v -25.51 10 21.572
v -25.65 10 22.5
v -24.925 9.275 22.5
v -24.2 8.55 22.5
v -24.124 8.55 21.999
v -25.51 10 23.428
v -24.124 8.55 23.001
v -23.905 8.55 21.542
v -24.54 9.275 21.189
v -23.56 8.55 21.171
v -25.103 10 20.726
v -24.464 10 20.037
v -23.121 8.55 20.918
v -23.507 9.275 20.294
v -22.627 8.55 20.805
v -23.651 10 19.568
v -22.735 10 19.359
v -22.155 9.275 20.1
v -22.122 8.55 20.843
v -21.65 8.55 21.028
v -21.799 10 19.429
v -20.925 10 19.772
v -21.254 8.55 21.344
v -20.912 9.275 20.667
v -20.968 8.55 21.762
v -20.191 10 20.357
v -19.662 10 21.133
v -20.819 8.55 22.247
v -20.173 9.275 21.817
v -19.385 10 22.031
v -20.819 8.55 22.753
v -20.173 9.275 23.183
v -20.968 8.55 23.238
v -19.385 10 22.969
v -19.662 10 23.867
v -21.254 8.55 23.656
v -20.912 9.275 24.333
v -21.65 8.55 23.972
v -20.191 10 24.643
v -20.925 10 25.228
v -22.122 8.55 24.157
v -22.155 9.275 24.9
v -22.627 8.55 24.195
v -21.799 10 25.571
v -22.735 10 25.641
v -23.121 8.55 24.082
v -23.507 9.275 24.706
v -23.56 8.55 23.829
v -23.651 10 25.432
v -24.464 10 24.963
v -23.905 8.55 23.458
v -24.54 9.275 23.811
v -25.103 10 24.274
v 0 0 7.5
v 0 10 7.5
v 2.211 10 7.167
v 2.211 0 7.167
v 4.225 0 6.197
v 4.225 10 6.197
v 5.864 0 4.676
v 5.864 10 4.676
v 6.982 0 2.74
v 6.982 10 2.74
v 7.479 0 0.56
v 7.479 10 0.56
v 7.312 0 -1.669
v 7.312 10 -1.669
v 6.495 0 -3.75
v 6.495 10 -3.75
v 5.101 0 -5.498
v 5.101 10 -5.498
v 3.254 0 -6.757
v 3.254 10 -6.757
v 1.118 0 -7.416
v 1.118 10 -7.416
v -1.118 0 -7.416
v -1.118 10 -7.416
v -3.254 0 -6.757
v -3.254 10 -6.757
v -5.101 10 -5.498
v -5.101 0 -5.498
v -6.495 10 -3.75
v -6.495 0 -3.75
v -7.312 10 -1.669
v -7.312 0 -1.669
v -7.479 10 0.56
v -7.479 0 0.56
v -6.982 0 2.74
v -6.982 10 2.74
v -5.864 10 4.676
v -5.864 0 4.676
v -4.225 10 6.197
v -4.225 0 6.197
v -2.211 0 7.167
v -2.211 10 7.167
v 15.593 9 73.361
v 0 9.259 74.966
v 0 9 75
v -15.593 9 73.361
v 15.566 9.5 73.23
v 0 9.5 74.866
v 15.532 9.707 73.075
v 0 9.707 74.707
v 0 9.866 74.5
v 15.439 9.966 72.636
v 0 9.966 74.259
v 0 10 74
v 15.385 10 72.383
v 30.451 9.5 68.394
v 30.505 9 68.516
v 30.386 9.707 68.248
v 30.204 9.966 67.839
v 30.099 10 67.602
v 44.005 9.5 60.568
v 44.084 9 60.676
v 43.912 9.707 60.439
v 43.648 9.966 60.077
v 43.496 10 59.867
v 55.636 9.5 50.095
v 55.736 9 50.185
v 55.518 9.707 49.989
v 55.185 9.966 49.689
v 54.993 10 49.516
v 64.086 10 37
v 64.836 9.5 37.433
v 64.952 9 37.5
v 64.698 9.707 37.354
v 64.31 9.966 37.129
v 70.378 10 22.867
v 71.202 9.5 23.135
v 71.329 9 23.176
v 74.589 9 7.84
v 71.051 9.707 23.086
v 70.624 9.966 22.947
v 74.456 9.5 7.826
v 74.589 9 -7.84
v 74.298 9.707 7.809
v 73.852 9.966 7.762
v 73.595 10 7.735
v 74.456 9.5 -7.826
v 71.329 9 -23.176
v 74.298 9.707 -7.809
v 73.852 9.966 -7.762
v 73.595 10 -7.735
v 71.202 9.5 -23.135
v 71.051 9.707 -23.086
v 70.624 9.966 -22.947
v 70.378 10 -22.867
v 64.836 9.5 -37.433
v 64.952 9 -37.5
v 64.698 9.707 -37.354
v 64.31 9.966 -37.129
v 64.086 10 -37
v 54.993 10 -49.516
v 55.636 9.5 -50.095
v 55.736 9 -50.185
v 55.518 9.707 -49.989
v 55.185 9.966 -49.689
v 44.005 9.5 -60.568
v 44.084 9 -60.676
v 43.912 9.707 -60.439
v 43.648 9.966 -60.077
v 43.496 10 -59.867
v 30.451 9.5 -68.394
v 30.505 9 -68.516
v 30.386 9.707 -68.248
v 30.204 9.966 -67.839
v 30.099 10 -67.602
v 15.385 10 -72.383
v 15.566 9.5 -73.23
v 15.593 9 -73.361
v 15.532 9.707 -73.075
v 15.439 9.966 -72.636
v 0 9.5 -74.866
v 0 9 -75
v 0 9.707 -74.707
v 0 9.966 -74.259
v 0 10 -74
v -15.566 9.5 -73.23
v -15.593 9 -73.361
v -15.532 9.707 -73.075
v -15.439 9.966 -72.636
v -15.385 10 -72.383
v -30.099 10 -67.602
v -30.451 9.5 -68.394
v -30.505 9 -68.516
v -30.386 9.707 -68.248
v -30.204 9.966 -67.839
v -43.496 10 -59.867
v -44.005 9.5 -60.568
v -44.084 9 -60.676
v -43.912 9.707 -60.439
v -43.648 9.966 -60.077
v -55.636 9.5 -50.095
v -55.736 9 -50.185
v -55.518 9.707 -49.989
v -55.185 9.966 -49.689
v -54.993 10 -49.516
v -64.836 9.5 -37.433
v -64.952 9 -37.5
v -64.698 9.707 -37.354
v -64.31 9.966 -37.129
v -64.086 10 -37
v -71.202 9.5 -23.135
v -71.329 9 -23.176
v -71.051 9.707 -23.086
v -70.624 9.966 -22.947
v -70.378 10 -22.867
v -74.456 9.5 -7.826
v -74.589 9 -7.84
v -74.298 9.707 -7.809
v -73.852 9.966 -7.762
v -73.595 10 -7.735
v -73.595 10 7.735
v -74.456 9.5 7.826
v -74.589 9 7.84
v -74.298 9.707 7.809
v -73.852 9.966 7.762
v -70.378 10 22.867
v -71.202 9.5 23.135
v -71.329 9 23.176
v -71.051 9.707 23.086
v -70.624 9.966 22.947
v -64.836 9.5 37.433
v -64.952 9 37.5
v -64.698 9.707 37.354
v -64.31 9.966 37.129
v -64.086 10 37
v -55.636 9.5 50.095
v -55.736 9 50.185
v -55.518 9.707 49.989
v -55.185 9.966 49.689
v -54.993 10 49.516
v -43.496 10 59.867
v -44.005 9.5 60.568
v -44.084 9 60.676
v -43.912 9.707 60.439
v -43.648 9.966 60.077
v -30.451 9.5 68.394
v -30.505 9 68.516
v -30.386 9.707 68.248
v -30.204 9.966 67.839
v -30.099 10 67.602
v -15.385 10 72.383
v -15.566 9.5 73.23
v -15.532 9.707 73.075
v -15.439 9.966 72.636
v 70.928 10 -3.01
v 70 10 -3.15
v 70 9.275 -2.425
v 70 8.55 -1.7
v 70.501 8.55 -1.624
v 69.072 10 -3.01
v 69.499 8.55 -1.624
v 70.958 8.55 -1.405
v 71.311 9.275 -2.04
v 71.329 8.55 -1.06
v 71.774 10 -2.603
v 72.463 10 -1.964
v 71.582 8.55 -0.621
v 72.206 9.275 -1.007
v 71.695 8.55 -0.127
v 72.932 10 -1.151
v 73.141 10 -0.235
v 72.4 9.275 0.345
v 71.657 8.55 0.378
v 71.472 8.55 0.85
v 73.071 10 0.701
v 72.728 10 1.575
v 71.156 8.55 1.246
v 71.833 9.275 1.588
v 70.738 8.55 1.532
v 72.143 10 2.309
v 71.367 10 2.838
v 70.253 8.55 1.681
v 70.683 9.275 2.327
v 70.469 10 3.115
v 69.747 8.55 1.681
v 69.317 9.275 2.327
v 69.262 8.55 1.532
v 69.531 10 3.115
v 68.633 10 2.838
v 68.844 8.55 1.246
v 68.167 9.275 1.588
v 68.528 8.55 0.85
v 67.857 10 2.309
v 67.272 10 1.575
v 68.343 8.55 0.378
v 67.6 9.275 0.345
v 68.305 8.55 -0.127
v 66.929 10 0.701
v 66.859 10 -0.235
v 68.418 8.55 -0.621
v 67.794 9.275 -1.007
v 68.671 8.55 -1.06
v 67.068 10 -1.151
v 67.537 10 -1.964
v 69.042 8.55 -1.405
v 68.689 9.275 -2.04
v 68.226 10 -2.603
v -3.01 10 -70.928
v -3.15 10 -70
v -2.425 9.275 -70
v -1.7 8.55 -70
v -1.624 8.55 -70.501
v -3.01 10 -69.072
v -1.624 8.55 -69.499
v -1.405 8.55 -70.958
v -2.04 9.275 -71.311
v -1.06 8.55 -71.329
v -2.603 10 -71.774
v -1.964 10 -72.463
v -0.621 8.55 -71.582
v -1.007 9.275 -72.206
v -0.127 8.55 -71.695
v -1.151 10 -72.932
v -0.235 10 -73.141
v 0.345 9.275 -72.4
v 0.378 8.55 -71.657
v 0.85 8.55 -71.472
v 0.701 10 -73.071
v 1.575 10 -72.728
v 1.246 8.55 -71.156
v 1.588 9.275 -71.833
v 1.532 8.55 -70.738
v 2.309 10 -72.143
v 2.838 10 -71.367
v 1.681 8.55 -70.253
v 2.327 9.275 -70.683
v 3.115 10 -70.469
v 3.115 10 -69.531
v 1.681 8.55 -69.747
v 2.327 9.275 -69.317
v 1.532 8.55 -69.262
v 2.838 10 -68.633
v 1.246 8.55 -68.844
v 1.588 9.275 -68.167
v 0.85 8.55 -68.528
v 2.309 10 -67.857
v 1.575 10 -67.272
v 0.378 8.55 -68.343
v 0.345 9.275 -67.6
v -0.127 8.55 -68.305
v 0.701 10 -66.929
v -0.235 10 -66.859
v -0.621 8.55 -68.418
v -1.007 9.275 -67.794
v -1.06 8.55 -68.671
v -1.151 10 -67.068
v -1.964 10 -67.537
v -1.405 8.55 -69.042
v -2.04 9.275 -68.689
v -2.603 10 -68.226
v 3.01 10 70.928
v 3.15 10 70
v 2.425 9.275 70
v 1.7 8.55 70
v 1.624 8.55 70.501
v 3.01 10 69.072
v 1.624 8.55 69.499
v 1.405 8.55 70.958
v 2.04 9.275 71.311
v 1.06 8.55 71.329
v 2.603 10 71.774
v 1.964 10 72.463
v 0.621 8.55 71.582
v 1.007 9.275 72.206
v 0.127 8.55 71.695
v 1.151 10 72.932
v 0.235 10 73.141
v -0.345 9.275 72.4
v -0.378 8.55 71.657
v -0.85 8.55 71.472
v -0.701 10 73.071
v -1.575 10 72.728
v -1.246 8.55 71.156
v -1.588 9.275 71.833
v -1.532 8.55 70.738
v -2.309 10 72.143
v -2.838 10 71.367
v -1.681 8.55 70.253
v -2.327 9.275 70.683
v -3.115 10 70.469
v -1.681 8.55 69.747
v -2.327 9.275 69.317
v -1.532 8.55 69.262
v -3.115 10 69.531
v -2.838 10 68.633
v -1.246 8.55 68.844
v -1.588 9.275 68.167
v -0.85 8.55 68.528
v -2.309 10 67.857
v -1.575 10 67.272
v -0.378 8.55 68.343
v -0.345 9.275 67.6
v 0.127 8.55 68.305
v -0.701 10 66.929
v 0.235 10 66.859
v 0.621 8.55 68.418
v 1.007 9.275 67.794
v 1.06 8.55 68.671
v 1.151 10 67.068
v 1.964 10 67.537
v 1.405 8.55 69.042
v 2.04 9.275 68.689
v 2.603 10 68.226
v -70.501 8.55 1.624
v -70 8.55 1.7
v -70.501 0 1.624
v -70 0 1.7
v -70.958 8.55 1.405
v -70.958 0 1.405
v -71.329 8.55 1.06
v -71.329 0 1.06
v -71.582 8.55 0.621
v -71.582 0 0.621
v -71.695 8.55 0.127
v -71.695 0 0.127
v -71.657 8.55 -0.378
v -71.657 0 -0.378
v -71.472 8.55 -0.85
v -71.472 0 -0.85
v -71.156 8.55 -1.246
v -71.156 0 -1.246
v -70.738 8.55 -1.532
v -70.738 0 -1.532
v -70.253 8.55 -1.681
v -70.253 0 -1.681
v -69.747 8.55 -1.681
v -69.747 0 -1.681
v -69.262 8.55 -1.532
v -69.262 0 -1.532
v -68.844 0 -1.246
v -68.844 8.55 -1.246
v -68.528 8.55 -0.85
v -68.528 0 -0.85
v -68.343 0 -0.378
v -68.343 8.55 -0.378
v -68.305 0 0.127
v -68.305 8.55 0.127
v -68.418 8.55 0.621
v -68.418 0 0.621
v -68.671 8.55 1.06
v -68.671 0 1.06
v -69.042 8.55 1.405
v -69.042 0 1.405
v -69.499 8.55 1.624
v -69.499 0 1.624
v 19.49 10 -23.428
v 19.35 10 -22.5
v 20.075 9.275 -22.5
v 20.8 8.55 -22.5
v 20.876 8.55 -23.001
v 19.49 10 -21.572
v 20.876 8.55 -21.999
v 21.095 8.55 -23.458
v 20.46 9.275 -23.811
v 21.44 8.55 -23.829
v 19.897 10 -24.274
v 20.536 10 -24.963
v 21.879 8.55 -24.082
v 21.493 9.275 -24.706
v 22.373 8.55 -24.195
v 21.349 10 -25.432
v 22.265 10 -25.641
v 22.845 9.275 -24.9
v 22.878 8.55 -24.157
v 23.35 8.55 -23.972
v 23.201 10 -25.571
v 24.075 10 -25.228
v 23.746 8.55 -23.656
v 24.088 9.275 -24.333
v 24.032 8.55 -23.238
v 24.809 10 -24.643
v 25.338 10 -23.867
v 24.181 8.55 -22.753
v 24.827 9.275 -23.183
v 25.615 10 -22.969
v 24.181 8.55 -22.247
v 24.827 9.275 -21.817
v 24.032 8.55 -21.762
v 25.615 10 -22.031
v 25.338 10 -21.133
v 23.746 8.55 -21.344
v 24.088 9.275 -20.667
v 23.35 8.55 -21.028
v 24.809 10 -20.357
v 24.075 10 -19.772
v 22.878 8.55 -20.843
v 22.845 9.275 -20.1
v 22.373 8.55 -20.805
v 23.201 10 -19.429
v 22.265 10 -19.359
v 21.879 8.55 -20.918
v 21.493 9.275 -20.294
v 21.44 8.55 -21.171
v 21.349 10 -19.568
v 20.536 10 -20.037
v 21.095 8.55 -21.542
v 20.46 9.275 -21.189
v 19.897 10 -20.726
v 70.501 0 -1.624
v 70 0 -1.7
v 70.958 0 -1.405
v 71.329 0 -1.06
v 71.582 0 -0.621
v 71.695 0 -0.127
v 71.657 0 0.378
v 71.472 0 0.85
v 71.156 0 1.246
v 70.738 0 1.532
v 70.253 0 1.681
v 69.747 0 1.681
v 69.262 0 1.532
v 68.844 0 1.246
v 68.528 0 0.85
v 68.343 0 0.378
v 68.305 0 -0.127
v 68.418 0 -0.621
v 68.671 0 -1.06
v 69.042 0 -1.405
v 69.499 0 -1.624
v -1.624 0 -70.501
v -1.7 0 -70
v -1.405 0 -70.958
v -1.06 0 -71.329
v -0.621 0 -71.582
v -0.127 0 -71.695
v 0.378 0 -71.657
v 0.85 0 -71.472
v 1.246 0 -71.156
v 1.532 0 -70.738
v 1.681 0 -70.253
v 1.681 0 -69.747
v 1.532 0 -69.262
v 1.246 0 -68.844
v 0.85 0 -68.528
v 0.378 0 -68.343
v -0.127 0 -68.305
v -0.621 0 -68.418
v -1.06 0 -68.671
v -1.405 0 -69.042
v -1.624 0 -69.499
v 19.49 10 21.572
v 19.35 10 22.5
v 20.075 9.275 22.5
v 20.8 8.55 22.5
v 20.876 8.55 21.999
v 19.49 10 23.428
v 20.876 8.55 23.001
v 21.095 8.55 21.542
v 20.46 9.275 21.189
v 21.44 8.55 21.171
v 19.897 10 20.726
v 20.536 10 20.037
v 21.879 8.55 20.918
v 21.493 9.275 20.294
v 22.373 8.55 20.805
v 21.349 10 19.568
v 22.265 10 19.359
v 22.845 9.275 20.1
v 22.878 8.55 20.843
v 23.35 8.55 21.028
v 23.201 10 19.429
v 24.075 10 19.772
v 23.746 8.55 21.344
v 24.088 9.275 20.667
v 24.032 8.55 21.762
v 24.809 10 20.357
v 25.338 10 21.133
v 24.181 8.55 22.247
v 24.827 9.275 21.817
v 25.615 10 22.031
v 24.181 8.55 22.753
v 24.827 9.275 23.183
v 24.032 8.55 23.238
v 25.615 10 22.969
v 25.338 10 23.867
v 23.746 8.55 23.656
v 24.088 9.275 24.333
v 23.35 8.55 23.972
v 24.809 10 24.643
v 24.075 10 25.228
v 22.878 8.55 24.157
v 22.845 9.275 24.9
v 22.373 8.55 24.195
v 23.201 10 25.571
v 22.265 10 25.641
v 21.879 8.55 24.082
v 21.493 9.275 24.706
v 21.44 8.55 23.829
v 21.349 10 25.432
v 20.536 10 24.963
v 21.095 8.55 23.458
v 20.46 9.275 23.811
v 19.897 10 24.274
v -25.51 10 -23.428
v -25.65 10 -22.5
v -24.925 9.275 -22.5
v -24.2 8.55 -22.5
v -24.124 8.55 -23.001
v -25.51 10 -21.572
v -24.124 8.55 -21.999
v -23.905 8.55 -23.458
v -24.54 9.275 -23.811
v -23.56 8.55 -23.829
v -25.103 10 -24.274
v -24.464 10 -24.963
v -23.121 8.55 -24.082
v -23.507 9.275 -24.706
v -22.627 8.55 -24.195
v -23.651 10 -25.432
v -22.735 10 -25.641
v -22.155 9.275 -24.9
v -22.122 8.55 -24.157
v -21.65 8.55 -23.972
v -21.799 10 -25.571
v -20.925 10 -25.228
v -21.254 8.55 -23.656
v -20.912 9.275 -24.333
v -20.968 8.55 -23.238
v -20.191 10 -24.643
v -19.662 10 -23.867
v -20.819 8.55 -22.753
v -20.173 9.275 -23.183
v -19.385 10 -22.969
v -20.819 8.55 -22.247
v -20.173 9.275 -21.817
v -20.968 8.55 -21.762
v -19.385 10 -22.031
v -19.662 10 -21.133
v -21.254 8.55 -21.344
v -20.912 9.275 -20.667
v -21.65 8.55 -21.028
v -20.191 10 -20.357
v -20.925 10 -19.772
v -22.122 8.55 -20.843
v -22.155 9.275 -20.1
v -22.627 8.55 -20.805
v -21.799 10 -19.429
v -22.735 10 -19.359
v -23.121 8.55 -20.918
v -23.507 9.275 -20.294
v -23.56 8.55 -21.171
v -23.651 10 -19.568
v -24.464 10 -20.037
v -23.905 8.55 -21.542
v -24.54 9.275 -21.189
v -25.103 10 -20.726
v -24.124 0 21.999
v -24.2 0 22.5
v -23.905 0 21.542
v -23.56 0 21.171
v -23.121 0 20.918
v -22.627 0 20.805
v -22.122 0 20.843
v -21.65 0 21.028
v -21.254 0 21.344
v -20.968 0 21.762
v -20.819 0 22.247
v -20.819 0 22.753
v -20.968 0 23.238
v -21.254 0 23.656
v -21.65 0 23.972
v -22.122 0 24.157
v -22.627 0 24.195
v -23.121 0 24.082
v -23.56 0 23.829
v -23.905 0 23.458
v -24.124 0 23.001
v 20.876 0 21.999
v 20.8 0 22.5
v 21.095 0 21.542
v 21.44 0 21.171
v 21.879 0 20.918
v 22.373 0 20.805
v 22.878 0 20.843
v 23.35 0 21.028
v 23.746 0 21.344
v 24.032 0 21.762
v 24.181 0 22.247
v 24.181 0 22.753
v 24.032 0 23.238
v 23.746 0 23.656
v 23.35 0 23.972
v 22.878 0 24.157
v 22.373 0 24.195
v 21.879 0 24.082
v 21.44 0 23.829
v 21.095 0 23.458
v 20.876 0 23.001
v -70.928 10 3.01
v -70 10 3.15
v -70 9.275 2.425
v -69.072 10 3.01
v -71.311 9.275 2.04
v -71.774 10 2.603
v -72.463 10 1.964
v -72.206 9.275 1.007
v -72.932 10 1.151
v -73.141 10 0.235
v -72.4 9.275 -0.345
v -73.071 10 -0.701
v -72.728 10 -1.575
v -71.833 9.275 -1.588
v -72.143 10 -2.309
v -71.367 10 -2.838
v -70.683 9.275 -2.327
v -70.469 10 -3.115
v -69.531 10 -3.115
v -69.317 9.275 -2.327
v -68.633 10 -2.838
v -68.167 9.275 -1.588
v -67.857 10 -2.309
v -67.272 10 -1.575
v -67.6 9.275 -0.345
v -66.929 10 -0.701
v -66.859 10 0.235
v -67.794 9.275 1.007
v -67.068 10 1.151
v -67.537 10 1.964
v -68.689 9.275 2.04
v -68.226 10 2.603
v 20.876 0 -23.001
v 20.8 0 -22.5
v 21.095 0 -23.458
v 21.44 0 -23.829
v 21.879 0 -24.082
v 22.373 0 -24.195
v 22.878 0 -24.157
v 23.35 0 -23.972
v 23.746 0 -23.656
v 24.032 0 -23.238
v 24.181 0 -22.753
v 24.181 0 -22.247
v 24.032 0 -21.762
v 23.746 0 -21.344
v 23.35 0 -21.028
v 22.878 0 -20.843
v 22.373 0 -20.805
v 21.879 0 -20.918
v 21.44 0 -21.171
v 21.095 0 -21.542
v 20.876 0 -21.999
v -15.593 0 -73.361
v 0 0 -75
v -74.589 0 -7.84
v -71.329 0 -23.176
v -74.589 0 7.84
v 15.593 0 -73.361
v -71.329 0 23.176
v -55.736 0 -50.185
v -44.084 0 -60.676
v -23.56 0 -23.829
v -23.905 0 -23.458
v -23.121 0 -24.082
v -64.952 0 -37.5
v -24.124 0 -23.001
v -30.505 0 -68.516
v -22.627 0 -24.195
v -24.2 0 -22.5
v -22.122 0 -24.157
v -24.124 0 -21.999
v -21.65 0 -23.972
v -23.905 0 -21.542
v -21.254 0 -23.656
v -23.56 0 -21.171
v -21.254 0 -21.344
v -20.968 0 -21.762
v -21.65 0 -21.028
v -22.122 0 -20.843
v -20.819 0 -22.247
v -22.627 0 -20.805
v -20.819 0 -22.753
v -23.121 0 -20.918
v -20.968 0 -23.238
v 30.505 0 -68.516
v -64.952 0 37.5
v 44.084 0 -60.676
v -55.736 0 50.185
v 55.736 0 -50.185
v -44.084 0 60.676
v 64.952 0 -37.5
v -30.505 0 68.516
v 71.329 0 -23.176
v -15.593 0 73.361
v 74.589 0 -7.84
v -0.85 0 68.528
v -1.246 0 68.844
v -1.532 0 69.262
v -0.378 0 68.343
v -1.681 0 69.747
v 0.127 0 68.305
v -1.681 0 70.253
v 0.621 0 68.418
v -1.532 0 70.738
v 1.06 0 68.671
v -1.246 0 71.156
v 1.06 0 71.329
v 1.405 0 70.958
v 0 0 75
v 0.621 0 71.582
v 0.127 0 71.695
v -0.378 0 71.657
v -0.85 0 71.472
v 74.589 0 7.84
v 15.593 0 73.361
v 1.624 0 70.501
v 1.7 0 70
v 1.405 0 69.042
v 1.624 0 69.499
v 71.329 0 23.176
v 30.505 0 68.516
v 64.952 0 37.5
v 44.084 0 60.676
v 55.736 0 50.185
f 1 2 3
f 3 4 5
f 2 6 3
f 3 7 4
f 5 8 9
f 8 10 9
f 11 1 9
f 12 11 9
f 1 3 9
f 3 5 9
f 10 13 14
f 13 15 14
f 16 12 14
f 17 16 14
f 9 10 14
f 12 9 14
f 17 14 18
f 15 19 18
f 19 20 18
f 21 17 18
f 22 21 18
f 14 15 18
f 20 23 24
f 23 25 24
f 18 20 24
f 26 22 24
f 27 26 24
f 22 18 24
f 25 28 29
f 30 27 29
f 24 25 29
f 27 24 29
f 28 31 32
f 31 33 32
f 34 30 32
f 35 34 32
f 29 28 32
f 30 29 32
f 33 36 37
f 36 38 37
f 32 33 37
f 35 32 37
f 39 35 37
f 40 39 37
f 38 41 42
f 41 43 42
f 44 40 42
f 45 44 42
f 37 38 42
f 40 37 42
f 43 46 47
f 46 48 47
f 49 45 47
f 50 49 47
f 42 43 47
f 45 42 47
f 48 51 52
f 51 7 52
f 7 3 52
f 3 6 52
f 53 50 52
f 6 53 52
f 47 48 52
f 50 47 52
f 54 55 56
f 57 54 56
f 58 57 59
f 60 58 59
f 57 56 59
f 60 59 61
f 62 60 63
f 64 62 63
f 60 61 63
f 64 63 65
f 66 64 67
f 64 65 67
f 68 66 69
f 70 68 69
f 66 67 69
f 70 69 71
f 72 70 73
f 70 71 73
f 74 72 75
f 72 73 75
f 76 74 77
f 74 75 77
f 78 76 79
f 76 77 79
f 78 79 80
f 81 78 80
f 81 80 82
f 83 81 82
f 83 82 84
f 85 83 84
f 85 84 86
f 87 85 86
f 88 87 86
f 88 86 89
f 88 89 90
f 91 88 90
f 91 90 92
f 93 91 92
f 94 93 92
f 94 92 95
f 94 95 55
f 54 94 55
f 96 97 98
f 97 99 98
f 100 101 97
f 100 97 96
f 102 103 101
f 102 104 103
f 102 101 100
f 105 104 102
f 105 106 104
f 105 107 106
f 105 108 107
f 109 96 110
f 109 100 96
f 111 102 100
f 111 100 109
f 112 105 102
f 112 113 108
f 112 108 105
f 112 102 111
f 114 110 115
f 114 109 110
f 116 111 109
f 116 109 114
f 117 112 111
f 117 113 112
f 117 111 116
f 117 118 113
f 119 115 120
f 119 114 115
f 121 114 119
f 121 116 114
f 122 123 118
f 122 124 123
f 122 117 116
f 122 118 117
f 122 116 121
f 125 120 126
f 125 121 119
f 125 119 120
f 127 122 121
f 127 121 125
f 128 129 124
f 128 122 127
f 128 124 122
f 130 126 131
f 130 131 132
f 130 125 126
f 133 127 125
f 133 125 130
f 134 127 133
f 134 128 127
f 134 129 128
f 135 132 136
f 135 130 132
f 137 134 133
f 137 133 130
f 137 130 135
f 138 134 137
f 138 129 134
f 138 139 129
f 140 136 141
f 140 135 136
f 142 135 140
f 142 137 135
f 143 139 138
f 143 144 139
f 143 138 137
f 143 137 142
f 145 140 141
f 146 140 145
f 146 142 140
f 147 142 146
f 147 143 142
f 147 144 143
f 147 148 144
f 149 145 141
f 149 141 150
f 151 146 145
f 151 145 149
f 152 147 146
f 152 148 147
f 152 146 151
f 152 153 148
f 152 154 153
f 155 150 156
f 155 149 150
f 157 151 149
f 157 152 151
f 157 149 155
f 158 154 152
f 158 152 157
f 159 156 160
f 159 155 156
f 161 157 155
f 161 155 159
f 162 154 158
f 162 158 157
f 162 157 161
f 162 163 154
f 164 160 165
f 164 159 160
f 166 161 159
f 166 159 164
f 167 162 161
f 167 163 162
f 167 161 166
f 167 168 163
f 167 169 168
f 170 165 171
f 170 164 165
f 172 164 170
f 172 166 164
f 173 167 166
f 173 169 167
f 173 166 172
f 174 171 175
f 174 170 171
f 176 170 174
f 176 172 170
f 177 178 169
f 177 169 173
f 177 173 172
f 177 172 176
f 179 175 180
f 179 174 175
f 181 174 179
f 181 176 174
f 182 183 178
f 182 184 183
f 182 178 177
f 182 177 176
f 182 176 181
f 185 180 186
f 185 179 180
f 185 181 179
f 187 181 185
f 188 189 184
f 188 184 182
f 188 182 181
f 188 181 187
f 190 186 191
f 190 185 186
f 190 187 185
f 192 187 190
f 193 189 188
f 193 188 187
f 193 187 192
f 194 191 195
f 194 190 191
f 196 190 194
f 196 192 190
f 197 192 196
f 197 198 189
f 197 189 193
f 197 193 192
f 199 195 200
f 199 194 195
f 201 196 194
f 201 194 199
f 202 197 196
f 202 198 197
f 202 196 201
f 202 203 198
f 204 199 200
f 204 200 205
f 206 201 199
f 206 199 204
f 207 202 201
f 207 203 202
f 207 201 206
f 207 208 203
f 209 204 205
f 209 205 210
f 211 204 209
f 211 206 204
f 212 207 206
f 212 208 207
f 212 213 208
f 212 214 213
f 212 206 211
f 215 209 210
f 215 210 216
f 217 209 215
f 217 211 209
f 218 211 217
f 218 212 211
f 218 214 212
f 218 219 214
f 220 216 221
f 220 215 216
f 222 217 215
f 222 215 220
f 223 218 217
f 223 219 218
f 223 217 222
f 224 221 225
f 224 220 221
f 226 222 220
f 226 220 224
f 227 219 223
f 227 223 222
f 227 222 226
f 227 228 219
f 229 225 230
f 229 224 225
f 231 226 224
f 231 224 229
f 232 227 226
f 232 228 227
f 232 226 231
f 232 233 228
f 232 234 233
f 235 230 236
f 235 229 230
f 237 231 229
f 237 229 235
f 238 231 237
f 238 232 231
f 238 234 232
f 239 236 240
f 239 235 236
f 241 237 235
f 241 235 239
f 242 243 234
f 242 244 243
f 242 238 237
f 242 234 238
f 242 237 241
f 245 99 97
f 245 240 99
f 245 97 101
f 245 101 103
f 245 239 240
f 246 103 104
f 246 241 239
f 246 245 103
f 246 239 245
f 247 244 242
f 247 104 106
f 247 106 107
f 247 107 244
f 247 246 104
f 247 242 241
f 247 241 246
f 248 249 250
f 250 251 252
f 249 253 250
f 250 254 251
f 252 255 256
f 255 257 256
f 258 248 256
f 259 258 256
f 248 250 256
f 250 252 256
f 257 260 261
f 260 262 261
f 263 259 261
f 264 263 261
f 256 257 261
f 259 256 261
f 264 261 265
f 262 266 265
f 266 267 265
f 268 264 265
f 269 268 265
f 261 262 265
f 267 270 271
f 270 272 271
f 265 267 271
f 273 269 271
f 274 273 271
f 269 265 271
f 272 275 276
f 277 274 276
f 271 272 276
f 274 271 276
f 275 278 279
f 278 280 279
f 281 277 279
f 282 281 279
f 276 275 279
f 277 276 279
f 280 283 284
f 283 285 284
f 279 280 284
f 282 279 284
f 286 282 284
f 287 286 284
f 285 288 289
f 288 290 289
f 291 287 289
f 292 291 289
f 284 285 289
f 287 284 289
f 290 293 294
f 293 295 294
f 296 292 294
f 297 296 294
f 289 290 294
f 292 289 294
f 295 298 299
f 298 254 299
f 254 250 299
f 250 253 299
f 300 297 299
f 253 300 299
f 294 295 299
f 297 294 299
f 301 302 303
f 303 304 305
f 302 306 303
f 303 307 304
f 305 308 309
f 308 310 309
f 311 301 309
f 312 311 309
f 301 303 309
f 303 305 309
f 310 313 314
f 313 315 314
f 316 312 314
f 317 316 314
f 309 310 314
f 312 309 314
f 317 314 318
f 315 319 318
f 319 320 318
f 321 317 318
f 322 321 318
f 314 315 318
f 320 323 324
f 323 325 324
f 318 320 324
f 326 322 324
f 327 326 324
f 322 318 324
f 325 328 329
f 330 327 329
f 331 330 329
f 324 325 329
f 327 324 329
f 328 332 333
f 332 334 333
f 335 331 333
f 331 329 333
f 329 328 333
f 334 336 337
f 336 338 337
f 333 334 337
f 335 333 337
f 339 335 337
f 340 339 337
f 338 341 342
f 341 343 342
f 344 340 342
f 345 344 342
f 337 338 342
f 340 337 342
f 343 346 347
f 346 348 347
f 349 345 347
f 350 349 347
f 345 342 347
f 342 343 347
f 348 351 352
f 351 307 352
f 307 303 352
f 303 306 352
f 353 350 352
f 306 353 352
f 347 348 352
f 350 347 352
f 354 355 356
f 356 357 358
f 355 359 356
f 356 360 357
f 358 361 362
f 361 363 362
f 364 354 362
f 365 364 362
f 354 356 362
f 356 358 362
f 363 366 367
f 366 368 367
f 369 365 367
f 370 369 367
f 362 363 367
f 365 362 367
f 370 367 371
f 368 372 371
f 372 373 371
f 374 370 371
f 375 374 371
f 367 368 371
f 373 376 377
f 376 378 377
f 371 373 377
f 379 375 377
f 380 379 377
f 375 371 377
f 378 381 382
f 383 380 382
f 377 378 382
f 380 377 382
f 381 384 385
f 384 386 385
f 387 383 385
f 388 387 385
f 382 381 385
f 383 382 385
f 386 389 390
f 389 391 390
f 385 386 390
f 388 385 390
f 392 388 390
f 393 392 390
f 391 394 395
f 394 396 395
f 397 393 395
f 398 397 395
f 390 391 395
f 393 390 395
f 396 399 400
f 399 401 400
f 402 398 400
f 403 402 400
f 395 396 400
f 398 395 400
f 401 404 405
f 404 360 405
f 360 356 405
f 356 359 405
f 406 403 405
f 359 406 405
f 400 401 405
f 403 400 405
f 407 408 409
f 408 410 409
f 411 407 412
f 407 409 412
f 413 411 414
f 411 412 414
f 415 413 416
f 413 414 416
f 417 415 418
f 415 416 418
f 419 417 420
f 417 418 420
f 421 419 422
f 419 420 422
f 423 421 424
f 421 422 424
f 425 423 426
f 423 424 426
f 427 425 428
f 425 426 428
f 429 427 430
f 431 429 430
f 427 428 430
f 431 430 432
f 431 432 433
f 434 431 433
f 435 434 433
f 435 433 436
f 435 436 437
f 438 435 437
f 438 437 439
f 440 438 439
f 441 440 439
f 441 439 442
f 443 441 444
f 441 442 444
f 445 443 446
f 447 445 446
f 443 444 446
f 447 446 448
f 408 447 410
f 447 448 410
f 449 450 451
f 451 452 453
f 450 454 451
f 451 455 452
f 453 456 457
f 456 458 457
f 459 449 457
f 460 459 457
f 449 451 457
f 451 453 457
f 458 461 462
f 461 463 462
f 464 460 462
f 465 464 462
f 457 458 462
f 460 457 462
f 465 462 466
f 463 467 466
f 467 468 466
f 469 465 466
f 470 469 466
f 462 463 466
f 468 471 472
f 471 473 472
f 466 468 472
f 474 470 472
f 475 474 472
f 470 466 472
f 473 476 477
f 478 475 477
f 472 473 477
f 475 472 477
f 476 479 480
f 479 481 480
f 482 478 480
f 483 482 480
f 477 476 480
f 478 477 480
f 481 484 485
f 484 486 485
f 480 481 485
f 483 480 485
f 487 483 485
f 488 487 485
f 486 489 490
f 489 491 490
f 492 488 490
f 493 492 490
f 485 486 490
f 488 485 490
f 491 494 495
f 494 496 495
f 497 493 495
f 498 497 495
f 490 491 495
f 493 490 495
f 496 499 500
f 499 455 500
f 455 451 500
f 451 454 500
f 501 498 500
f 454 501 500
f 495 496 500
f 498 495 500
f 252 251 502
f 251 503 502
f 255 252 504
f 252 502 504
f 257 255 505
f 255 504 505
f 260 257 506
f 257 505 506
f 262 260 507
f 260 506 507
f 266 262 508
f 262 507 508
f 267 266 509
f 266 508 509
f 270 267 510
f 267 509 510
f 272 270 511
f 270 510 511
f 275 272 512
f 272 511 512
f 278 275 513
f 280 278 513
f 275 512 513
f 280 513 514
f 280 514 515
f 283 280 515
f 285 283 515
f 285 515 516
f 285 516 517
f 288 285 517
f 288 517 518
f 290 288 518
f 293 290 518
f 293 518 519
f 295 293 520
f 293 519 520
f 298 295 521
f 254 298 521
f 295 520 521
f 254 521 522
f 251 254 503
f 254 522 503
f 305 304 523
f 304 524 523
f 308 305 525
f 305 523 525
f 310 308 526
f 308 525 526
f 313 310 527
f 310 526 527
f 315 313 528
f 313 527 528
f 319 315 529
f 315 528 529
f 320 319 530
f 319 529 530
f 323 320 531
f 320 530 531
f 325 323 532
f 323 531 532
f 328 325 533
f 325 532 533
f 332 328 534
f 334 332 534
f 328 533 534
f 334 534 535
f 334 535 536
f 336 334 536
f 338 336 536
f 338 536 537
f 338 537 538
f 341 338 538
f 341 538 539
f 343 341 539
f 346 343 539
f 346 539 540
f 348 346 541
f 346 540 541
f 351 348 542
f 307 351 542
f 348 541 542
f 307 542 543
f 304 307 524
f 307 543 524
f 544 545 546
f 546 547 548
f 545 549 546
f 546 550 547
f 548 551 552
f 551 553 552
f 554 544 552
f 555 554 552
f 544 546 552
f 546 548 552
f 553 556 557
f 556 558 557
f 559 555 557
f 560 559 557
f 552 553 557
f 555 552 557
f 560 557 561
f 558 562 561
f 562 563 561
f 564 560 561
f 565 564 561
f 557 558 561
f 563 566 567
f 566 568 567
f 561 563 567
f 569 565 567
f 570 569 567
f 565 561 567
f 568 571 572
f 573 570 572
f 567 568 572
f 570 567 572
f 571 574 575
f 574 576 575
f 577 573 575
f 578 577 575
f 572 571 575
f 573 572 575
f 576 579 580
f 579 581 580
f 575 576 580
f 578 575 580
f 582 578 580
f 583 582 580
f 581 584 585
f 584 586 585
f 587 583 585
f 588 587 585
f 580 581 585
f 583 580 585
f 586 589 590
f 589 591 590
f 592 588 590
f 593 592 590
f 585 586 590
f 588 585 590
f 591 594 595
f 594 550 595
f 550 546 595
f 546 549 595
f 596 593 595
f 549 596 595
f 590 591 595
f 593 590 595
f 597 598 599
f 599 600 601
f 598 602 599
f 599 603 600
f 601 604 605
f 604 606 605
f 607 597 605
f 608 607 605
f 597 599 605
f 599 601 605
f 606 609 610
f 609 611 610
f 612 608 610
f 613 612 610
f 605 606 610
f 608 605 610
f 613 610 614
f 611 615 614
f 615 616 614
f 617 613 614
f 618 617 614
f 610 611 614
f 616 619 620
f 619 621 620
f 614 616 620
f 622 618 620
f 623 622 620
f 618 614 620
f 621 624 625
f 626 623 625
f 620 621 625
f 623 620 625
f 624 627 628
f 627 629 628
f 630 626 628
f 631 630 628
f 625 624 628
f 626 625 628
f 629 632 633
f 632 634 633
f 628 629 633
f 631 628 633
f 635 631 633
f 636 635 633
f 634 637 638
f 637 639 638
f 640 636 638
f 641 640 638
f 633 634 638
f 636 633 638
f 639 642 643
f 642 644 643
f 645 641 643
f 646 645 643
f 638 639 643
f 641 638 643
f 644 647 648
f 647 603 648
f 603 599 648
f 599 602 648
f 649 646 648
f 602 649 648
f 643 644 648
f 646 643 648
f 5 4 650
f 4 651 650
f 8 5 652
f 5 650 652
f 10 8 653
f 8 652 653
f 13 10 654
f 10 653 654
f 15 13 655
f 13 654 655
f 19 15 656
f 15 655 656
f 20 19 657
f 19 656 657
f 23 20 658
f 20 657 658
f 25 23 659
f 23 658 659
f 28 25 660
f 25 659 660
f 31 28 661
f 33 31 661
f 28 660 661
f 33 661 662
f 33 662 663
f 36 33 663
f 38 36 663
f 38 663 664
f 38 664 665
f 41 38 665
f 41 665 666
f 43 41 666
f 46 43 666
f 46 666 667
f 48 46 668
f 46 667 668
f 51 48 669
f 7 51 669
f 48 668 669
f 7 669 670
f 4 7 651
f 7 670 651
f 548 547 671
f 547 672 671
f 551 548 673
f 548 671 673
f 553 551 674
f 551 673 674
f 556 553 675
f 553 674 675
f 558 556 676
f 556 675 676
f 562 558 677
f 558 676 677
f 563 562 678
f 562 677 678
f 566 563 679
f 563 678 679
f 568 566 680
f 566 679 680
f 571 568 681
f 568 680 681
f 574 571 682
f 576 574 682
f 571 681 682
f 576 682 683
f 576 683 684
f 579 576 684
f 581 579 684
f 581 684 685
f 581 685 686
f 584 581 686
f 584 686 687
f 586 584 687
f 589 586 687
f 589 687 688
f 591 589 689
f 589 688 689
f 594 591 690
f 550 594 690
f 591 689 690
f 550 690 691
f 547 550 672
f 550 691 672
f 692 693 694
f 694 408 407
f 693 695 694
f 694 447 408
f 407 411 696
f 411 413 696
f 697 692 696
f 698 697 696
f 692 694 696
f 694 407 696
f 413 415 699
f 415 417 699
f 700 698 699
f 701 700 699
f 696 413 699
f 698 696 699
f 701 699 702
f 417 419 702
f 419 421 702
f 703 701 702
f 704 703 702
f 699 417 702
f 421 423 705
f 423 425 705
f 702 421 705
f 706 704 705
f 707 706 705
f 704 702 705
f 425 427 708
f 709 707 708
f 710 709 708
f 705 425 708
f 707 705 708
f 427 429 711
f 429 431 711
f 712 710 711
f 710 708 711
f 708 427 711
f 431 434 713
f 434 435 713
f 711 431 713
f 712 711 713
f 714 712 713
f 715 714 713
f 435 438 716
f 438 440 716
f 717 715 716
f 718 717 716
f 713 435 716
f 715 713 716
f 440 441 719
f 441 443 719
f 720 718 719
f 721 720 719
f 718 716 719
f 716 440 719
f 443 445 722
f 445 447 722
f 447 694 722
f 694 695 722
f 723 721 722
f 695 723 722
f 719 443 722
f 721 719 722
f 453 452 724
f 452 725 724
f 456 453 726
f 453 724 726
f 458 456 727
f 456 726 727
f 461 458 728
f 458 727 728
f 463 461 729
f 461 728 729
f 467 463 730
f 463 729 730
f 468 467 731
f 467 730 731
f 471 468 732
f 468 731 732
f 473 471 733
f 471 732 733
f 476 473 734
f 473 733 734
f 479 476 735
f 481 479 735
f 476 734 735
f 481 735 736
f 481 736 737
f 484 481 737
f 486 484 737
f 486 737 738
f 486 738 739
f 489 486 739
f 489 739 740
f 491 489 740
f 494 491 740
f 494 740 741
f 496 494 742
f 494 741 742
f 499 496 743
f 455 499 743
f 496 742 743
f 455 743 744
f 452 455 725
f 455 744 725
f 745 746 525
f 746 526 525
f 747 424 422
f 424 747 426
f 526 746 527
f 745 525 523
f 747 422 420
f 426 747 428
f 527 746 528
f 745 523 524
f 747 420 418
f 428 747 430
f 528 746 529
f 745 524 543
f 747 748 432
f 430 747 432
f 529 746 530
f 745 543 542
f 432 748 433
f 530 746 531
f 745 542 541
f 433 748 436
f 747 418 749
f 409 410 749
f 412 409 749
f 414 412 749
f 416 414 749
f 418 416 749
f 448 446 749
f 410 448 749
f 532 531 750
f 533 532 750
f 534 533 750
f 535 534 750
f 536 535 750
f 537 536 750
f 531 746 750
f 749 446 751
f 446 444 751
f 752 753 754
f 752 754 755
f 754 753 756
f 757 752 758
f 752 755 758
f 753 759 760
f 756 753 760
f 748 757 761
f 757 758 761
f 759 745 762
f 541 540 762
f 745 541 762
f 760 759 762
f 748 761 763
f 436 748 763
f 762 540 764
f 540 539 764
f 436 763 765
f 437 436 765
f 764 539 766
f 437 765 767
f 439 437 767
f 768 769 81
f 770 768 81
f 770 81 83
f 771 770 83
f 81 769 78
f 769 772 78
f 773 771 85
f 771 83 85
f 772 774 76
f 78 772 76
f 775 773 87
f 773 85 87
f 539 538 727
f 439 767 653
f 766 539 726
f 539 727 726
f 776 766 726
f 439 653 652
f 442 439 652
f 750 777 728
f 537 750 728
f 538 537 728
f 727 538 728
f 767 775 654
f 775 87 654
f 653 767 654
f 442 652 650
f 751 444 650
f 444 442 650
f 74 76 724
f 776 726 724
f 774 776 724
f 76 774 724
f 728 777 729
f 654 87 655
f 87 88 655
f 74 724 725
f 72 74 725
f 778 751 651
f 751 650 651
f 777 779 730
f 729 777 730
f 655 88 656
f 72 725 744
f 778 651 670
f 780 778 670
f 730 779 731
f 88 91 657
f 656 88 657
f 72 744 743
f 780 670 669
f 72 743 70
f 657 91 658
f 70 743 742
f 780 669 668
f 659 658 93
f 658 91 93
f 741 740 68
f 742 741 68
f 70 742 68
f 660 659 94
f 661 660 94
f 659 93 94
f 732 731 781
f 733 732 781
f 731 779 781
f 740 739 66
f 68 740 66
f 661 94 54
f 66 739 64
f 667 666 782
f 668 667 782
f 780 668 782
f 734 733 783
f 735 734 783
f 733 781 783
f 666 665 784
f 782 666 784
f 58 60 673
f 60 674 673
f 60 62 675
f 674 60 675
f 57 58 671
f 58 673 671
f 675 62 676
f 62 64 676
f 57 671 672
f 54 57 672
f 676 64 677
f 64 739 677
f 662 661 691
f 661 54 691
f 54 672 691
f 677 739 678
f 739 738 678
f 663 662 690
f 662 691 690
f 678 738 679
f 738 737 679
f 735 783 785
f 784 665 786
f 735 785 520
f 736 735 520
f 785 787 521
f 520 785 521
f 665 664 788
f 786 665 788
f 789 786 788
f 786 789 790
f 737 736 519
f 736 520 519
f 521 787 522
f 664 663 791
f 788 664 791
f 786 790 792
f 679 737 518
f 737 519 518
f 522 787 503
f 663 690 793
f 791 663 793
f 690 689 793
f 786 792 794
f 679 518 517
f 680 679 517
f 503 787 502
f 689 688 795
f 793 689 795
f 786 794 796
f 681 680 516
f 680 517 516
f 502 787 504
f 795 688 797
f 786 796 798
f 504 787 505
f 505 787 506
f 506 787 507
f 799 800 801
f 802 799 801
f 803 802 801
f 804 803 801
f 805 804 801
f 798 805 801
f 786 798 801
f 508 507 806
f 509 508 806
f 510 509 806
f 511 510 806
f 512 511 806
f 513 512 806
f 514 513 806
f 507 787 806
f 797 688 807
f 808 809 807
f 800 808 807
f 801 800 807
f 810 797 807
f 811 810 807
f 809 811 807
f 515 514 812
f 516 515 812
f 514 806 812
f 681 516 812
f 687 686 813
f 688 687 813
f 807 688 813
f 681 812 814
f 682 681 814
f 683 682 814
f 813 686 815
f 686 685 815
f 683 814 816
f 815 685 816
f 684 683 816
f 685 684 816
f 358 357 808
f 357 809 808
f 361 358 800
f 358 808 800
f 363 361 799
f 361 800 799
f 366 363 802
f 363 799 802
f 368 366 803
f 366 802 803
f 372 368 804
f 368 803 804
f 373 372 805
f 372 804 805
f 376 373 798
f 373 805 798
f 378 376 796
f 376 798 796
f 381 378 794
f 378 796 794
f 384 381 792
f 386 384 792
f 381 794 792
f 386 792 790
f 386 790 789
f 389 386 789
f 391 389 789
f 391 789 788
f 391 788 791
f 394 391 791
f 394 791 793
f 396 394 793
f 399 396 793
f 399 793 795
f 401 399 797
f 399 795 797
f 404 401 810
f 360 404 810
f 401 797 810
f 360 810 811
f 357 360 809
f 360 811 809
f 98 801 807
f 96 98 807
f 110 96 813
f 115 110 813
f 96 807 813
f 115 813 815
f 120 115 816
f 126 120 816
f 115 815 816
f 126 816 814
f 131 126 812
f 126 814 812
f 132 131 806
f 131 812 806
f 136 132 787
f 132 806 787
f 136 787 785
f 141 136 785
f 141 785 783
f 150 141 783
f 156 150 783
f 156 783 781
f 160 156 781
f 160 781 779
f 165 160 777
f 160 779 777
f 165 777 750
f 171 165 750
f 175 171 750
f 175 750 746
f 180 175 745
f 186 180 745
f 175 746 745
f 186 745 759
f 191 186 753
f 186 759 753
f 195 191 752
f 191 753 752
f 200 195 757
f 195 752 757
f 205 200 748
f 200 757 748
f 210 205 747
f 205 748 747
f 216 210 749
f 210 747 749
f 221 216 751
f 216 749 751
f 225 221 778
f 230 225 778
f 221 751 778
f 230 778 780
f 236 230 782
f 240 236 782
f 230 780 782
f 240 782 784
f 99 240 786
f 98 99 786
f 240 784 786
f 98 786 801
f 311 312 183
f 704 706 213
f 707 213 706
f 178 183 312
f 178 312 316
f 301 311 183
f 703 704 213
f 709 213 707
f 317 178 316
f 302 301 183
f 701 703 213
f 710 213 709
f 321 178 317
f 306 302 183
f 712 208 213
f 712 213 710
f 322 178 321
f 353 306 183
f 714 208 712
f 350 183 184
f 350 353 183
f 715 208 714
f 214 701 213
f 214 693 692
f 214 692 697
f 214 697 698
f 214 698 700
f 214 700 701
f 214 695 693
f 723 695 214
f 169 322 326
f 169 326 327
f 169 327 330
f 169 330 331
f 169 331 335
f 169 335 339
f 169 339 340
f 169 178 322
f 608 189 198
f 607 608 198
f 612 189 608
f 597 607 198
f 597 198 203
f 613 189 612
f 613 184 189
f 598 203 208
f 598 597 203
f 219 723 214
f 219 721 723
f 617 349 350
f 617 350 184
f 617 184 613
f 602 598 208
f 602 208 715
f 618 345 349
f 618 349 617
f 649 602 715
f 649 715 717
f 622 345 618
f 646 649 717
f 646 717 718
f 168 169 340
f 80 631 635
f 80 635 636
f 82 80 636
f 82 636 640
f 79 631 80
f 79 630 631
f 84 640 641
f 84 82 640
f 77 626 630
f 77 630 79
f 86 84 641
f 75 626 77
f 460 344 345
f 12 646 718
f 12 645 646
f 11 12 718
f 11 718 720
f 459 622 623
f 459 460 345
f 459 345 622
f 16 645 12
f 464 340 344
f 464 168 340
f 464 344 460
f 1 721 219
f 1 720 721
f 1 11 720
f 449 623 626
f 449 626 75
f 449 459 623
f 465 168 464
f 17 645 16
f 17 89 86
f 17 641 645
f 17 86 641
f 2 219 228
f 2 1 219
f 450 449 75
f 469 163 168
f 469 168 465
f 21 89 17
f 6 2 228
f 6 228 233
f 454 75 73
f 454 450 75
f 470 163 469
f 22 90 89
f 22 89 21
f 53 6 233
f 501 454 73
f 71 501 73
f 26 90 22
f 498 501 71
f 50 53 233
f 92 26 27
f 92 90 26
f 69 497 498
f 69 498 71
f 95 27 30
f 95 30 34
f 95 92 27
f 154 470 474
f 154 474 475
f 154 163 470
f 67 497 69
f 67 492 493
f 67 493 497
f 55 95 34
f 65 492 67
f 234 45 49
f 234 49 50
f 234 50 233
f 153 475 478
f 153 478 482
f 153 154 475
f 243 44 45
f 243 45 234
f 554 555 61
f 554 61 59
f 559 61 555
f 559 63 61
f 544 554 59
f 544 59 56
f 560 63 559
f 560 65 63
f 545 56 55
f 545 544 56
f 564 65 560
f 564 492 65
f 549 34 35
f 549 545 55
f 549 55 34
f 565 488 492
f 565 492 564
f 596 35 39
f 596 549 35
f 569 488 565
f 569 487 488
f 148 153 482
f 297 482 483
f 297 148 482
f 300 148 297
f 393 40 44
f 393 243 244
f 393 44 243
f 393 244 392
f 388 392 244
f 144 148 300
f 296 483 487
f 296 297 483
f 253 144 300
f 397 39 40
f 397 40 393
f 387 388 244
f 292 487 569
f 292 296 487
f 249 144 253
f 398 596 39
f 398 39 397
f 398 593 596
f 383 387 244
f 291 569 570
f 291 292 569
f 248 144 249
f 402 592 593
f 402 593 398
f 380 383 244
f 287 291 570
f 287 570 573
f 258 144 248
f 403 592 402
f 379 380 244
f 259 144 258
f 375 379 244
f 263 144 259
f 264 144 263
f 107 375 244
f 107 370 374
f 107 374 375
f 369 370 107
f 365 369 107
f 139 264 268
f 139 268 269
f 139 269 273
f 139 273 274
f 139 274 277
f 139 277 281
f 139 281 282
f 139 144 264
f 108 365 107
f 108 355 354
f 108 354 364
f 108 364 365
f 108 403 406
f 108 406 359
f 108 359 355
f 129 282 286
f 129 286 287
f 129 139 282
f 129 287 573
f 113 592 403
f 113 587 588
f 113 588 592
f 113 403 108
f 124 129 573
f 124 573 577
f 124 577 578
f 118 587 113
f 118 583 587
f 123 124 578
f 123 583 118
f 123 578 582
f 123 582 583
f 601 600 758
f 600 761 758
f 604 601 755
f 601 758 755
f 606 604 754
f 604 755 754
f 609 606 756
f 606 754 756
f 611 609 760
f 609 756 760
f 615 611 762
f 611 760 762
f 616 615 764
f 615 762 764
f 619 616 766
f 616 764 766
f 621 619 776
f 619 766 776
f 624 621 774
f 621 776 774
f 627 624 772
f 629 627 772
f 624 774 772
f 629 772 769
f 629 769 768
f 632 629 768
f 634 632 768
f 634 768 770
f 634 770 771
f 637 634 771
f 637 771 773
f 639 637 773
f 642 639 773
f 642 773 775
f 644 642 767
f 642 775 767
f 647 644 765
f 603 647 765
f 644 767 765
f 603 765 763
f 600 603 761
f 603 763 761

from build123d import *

# Parameters (mm, degrees)
SKETCH1_R                                       = 75
BOSS_EXTRUDE1_DEPTH                             = 10
CSK_FOR_M3_FLAT_HEAD_MACHINE_SCREW1_D           = 3.4
CSK_FOR_M3_FLAT_HEAD_MACHINE_SCREW1_CSINK_D     = 6.3
CSK_FOR_M3_FLAT_HEAD_MACHINE_SCREW1_CSINK_ANGLE = 90
CIRPATTERN1_COUNT                               = 4
SKETCH8_R                                       = 7.5
CUT_EXTRUDE1_DEPTH                              = 107.536378763
CSK_FOR_M3_FLAT_HEAD_MACHINE_SCREW2_D           = 3.4
CSK_FOR_M3_FLAT_HEAD_MACHINE_SCREW2_CSINK_D     = 6.3
CSK_FOR_M3_FLAT_HEAD_MACHINE_SCREW2_CSINK_ANGLE = 90
FILLET1_R                                       = 1


with BuildPart() as part:
    # Sketch1 → Boss-Extrude1 (new body)
    with BuildSketch(Plane(origin=(0, 0, 0), x_dir=(1, 0, 0), z_dir=(0, 1, 0))):
        with Locations(Location((0, 0, 0), (0, 0, 270))):
            Circle(SKETCH1_R)
    extrude(amount=BOSS_EXTRUDE1_DEPTH)

    # CSK for M3 Flat Head Machine Screw1 (through all)
    with Locations(Plane(origin=(0, 10, 0), x_dir=(1, 0, 0), z_dir=(0, 1, 0))):
        with Locations((0, 70)):
            csk_for_m3_flat_head_machine_screw1 = CounterSinkHole(CSK_FOR_M3_FLAT_HEAD_MACHINE_SCREW1_D / 2, CSK_FOR_M3_FLAT_HEAD_MACHINE_SCREW1_CSINK_D / 2, counter_sink_angle=CSK_FOR_M3_FLAT_HEAD_MACHINE_SCREW1_CSINK_ANGLE)

    # CirPattern1: CSK for M3 Flat Head Machine Screw1 ×4 about axis
    cirpattern1_axis = Axis((0, 0, 0), (0, 1, 0))
    for i in range(1, CIRPATTERN1_COUNT):
        add(csk_for_m3_flat_head_machine_screw1.rotate(cirpattern1_axis, i * 360 / CIRPATTERN1_COUNT), mode=Mode.SUBTRACT)

    # Sketch8 → Cut-Extrude1 (cut, through all)
    with BuildSketch(Plane(origin=(0, 10, 0), x_dir=(1, 0, 0), z_dir=(0, 1, 0))):
        with Locations(Location((0, 0, 0), (0, 0, 270))):
            Circle(SKETCH8_R)
    extrude(amount=-CUT_EXTRUDE1_DEPTH, mode=Mode.SUBTRACT)

    # CSK for M3 Flat Head Machine Screw2 (through all)
    with Locations(Plane(origin=(0, 10, 0), x_dir=(1, 0, 0), z_dir=(0, 1, 0))):
        with Locations((22.5, 22.5), (22.5, -22.5), (-22.5, -22.5), (-22.5, 22.5)):
            CounterSinkHole(CSK_FOR_M3_FLAT_HEAD_MACHINE_SCREW2_D / 2, CSK_FOR_M3_FLAT_HEAD_MACHINE_SCREW2_CSINK_D / 2, counter_sink_angle=CSK_FOR_M3_FLAT_HEAD_MACHINE_SCREW2_CSINK_ANGLE)

    # Fillet1
    fillet1_edges = [part.edges().sort_by_distance(p)[0] for p in [
        (0, 10, -75),
    ]]
    fillet(fillet1_edges, radius=FILLET1_R)


solid = part.part
